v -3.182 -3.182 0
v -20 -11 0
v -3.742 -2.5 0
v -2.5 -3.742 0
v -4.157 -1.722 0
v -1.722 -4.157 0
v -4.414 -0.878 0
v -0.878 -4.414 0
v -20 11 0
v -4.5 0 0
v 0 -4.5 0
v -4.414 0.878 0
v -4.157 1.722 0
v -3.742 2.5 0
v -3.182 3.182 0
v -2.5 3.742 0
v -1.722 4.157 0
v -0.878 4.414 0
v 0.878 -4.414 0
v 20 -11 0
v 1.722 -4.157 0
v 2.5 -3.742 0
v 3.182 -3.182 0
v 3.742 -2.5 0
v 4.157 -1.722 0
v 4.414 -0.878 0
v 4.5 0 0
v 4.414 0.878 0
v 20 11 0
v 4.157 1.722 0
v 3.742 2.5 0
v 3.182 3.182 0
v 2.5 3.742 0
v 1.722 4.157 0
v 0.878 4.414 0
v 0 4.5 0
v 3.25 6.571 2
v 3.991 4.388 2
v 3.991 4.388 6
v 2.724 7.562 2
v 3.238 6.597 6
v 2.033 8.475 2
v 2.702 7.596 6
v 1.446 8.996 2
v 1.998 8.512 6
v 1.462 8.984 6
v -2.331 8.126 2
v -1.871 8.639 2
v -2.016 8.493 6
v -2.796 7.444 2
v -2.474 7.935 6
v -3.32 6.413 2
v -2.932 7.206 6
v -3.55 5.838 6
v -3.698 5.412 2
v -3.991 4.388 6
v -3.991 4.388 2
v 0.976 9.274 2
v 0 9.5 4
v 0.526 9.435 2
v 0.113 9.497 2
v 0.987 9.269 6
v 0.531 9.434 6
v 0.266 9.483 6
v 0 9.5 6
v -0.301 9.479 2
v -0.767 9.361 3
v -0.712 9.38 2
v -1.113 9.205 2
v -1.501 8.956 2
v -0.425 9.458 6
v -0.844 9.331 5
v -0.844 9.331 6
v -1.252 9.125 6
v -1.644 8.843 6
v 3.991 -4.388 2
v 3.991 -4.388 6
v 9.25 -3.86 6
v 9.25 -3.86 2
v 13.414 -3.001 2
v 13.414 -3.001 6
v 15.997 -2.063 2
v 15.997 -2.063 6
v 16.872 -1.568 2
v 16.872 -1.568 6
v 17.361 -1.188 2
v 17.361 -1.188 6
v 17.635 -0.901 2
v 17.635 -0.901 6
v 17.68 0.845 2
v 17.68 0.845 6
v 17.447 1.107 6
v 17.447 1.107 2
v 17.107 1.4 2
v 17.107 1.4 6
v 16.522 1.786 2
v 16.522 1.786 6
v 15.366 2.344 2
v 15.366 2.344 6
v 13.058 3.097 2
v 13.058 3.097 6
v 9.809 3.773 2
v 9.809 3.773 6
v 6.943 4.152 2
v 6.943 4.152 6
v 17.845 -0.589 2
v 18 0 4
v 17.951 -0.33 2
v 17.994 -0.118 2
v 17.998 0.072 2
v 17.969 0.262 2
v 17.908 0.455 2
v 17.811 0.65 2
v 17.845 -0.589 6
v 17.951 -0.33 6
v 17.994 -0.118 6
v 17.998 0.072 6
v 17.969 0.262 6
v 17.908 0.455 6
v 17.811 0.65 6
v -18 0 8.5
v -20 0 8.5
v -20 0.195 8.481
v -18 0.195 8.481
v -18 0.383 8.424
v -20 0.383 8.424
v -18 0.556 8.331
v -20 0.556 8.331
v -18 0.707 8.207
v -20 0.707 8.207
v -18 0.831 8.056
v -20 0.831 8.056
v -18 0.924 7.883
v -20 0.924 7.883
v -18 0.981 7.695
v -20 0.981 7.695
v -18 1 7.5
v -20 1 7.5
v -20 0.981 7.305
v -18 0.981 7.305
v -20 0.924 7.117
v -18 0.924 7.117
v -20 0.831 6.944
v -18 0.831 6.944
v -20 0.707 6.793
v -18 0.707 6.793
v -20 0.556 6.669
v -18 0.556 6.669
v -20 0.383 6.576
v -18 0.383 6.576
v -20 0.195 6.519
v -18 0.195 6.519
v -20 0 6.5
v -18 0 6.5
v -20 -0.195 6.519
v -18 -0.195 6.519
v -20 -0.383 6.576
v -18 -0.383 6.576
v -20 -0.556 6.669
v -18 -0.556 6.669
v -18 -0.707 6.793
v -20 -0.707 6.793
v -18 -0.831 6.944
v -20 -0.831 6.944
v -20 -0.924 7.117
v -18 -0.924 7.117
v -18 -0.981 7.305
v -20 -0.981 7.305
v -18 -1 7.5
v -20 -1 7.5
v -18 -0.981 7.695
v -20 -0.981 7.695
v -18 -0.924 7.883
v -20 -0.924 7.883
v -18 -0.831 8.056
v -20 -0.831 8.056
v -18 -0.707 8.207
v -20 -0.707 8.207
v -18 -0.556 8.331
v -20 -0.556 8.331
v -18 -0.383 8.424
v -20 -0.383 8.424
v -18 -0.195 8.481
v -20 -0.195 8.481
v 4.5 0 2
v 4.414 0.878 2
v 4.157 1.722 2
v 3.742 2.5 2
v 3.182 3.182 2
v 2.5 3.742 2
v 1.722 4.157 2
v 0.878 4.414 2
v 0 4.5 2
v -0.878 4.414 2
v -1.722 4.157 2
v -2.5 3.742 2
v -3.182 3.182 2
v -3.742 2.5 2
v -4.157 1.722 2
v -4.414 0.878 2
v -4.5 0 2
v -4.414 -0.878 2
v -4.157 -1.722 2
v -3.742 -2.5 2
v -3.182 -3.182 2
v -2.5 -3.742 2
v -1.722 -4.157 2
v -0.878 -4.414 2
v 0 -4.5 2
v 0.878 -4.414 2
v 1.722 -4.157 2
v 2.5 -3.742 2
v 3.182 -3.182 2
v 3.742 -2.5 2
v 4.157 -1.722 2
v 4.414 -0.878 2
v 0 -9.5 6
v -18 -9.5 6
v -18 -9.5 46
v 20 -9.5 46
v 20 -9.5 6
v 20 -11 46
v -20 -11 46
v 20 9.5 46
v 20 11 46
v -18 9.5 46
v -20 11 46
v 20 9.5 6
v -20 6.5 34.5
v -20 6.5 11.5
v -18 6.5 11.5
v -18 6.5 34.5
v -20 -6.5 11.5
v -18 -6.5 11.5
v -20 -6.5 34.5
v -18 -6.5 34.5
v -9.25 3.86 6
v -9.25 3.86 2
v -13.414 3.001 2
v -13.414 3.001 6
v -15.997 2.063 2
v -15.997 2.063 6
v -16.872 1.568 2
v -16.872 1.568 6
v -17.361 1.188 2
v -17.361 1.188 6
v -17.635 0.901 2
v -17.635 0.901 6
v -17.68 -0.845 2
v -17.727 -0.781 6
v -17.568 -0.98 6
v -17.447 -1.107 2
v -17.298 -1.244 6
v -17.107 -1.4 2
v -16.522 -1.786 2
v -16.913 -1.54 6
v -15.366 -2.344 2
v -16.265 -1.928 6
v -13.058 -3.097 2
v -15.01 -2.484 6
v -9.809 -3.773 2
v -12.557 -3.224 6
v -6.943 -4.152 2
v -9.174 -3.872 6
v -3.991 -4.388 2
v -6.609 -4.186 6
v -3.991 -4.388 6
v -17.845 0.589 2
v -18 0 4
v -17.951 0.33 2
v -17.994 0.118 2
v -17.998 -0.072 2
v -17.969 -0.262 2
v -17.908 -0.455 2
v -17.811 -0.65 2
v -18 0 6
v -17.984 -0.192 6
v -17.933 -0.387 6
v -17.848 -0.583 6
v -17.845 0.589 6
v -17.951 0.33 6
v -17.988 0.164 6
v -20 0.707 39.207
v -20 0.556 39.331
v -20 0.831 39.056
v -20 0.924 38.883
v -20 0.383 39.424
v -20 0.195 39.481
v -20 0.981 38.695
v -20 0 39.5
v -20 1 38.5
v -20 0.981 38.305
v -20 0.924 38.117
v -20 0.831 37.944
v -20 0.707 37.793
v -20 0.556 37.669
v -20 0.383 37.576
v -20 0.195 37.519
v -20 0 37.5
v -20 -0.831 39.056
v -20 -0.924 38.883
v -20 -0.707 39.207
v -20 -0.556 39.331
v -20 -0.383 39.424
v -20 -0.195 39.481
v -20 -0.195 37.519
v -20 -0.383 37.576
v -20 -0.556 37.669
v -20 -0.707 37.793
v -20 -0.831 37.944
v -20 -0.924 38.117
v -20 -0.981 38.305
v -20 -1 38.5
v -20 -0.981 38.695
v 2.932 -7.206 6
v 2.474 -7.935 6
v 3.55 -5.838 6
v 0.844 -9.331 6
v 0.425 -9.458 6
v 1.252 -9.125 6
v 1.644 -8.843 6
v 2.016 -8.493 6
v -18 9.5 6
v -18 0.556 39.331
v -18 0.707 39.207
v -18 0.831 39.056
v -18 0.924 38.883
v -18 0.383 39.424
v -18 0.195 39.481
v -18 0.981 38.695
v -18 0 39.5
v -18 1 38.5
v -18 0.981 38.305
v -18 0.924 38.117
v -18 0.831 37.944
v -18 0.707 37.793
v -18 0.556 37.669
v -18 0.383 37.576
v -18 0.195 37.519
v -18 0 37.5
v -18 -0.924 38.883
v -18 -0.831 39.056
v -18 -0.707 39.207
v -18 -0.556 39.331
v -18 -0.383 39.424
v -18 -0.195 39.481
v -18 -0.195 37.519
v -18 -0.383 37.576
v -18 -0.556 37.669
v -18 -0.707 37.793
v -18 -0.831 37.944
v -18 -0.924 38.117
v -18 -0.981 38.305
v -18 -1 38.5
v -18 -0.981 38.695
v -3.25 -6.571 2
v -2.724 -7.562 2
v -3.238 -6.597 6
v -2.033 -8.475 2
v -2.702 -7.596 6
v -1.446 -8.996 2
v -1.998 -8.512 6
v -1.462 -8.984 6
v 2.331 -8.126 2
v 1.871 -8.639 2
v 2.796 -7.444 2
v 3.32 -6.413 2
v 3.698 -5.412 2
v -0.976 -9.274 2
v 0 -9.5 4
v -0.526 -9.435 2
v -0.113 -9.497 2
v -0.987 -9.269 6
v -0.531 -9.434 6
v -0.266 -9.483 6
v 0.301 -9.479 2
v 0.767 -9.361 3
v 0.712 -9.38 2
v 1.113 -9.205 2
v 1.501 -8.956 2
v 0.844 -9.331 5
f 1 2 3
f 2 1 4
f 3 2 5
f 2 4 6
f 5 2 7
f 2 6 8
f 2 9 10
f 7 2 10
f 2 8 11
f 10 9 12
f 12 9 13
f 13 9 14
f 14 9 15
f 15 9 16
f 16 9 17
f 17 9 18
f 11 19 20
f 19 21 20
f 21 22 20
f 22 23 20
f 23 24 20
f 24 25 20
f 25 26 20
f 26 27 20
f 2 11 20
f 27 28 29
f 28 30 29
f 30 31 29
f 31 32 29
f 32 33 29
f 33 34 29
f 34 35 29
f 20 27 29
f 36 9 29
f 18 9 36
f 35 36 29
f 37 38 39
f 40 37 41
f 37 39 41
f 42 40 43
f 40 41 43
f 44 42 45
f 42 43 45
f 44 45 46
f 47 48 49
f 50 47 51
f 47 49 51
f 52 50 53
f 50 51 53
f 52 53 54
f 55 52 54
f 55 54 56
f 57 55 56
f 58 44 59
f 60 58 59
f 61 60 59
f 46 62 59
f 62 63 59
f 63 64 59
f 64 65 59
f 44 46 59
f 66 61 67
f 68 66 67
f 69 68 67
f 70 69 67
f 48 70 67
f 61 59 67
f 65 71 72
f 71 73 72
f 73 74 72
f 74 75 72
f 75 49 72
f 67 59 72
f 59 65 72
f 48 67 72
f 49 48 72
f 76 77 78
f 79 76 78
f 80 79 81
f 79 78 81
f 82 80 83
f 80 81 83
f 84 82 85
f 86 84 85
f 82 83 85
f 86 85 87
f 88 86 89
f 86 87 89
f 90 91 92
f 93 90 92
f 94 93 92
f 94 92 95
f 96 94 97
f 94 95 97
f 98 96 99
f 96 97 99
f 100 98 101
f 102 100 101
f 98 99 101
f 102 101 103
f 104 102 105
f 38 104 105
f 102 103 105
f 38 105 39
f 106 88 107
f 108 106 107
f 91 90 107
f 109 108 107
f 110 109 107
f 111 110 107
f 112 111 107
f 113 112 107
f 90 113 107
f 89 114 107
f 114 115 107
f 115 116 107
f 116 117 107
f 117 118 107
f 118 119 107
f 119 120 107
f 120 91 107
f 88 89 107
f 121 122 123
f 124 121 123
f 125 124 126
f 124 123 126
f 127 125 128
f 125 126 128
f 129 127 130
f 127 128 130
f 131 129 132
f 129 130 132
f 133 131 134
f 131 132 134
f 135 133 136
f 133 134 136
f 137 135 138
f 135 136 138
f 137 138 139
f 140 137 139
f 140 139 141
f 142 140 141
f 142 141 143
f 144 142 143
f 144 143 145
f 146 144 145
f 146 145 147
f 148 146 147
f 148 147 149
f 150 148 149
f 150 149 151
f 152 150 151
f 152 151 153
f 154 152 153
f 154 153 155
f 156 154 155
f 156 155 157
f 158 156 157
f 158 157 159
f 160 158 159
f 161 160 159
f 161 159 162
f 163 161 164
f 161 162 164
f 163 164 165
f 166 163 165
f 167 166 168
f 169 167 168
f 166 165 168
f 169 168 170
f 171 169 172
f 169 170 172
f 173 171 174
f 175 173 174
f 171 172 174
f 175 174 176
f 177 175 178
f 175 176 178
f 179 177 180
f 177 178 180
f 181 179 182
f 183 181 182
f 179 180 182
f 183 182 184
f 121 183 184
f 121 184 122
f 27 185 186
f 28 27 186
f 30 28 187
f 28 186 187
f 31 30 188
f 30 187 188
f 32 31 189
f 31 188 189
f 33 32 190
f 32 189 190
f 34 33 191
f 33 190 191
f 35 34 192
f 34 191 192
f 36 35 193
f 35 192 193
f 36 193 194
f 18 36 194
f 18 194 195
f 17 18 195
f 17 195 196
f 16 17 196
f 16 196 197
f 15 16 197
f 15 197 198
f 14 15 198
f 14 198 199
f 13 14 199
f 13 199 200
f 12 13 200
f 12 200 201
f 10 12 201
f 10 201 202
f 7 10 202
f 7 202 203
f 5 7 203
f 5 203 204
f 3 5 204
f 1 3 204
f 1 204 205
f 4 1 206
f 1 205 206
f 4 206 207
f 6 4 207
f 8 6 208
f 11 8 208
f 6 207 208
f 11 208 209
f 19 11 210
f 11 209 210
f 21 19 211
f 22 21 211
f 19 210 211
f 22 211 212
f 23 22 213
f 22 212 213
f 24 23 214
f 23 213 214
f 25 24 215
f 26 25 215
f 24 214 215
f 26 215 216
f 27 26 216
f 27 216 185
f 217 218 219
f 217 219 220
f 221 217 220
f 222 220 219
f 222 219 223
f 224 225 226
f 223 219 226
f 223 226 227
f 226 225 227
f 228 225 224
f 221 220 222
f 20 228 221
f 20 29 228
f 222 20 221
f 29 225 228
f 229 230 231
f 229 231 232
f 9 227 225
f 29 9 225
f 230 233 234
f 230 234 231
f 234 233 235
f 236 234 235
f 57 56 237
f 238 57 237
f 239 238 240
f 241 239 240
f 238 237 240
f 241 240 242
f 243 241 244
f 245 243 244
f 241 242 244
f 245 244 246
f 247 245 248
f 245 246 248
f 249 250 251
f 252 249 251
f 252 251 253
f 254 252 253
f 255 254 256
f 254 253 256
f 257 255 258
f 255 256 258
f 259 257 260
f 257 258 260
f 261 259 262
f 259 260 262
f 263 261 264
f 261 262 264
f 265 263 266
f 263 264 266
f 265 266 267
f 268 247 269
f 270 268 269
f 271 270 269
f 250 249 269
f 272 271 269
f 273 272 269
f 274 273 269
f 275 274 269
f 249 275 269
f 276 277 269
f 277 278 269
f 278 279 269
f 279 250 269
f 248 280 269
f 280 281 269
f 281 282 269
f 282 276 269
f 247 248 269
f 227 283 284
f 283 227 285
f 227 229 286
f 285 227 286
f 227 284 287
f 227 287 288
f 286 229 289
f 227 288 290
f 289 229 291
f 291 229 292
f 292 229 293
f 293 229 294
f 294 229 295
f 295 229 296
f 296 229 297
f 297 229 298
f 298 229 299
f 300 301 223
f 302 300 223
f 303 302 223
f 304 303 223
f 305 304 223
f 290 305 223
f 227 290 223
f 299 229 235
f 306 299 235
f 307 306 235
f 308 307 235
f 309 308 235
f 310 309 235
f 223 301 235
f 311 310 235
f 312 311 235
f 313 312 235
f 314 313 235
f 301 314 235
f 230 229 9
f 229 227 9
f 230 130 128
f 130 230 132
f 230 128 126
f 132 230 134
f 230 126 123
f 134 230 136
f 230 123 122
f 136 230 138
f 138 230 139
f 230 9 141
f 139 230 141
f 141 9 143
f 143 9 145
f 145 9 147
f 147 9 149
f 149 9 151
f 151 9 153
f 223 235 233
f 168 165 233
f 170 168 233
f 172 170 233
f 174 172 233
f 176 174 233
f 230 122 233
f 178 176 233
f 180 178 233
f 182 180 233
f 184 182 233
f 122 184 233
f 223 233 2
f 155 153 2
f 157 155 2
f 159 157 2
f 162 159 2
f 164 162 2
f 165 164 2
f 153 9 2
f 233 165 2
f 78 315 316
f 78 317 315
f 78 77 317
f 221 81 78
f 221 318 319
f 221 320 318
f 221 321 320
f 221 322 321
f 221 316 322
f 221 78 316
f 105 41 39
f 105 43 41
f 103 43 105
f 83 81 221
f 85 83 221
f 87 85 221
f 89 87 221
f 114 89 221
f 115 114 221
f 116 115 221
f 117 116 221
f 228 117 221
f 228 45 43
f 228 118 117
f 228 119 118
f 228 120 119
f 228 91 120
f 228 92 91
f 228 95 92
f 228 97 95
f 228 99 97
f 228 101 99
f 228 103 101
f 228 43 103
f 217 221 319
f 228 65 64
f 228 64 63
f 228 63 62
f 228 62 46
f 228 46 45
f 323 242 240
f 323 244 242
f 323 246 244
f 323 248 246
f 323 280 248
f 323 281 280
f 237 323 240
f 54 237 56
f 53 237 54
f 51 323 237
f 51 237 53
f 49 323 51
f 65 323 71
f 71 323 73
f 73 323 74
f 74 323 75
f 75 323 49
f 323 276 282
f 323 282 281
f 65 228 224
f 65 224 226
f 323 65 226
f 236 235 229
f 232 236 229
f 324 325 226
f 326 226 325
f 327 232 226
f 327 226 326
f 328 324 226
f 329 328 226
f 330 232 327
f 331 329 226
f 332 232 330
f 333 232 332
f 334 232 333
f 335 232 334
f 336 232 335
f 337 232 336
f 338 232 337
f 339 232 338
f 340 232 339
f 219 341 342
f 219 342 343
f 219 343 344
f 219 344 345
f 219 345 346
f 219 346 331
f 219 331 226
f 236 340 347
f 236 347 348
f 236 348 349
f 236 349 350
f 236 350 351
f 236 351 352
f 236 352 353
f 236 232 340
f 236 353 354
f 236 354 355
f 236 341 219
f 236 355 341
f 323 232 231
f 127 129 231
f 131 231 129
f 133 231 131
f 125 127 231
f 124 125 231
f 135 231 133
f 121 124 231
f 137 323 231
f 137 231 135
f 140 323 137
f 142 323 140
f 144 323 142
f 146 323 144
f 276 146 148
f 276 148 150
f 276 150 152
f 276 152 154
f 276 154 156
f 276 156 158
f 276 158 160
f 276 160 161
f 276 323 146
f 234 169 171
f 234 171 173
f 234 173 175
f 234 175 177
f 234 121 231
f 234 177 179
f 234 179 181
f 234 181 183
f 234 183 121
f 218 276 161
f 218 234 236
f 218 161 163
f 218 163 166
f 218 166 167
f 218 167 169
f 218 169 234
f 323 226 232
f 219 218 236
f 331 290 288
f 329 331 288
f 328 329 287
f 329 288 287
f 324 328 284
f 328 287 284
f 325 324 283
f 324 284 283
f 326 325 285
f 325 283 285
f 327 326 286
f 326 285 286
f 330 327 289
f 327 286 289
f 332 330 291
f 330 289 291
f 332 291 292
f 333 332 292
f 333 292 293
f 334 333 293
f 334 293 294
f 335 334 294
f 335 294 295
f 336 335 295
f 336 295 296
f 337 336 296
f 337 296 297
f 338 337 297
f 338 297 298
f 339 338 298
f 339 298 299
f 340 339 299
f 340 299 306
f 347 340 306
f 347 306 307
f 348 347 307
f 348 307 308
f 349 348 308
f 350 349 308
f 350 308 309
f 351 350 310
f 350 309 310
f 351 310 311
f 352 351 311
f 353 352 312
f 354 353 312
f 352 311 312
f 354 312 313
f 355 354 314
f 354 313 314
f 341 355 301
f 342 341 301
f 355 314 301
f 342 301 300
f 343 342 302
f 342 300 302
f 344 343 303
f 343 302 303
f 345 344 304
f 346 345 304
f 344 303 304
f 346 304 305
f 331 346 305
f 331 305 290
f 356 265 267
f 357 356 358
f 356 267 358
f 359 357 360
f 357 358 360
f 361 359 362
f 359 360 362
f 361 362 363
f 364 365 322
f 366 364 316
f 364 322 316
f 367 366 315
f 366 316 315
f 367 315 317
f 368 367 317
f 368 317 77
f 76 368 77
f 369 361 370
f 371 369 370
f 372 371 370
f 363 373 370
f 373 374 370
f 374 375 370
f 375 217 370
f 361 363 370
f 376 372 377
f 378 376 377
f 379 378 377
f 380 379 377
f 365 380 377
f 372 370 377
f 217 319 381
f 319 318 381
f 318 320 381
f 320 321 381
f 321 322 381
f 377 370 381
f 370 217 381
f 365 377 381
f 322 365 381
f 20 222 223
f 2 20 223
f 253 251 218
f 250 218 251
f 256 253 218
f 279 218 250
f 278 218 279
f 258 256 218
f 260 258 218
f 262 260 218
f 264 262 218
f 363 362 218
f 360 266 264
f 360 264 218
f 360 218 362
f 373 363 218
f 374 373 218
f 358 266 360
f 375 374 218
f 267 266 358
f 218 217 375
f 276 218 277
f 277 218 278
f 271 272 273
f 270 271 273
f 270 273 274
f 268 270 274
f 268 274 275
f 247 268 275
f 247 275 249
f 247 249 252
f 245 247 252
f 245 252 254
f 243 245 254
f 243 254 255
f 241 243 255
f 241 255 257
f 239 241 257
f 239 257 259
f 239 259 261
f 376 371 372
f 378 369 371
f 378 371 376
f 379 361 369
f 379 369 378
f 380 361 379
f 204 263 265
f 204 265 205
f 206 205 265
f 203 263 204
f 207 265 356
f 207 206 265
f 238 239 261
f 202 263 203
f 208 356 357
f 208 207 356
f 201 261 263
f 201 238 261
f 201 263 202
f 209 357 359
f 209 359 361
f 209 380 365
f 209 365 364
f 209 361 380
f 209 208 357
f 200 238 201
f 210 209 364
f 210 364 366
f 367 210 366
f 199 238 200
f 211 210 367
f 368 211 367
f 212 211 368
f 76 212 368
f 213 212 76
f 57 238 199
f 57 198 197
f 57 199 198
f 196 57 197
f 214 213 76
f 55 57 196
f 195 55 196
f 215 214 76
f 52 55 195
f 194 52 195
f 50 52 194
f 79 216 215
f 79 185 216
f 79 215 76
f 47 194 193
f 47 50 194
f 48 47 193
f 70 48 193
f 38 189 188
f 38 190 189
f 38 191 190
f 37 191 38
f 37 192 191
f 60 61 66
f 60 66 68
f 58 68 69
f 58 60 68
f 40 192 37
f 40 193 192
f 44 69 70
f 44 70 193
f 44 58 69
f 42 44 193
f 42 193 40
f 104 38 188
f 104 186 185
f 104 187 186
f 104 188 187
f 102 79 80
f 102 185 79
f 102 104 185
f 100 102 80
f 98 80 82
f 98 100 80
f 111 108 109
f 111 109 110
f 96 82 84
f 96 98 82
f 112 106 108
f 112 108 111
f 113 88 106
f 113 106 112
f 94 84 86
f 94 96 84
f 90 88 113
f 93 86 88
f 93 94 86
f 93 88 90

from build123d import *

# Parameters (mm, degrees)
SKETCH_1_W          = 40
SKETCH_1_H          = 22
SKETCH_1_R          = 4.5
EXTRUDE_1_DEPTH     = 6
CUT_EXTRUDE_2_DEPTH = 4
SKETCH_4_R          = 4.5
CUT_EXTRUDE_3_DEPTH = 7
EXTRUDE_2_DEPTH     = 40
SKETCH_6_W          = 23
SKETCH_6_H          = 13
CUT_EXTRUDE_4_DEPTH = 40
SKETCH_7_R          = 1
CUT_EXTRUDE_5_DEPTH = 40


with BuildPart() as part:
    # 草图1 → 凸台-拉伸1 (new body)
    with BuildSketch(Plane.XY):
        Rectangle(SKETCH_1_W, SKETCH_1_H)
        with BuildLine():
            add(Edge.make_bspline(
                [(3.991210712, -4.387982431), (18, -3.591602336), (18, 0), (18, 3.591602336), (3.991210712, 4.387982431)],
                knots=[4.935981285, 4.935981285, 4.935981285, 6.283185307, 6.283185307, 7.630389329, 7.630389329, 7.630389329], degree=2, weights=[1, 0.781579788, 1, 0.781579788, 1]))
            add(Edge.make_bspline(
                [(3.991210712, 4.387982431), (0, 20.567539049), (-3.991210712, 4.387982431)],
                knots=[5.192517184, 5.192517184, 5.192517184, 7.373853431, 7.373853431, 7.373853431], degree=2, weights=[1, 0.461892887, 1]))
            add(Edge.make_bspline(
                [(-3.991210712, 4.387982431), (-18, 3.591602336), (-18, 0), (-18, -3.591602336), (-3.991210712, -4.387982431)],
                knots=[1.794388632, 1.794388632, 1.794388632, 3.141592654, 3.141592654, 4.488796676, 4.488796676, 4.488796676], degree=2, weights=[1, 0.781579788, 1, 0.781579788, 1]))
            add(Edge.make_bspline(
                [(-3.991210712, -4.387982431), (0, -20.567539049), (3.991210712, -4.387982431)],
                knots=[2.05092453, 2.05092453, 2.05092453, 4.232260777, 4.232260777, 4.232260777], degree=2, weights=[1, 0.461892887, 1]))
        make_face(mode=Mode.SUBTRACT)
        with BuildLine():
            add(Edge.make_bspline(
                [(-3.991210712, -4.387982431), (0, -20.567539049), (3.991210712, -4.387982431)],
                knots=[2.05092453, 2.05092453, 2.05092453, 4.232260777, 4.232260777, 4.232260777], degree=2, weights=[1, 0.461892887, 1]))
            add(Edge.make_bspline(
                [(3.991210712, -4.387982431), (18, -3.591602336), (18, 0), (18, 3.591602336), (3.991210712, 4.387982431)],
                knots=[4.935981285, 4.935981285, 4.935981285, 6.283185307, 6.283185307, 7.630389329, 7.630389329, 7.630389329], degree=2, weights=[1, 0.781579788, 1, 0.781579788, 1]))
            add(Edge.make_bspline(
                [(3.991210712, 4.387982431), (0, 20.567539049), (-3.991210712, 4.387982431)],
                knots=[5.192517184, 5.192517184, 5.192517184, 7.373853431, 7.373853431, 7.373853431], degree=2, weights=[1, 0.461892887, 1]))
            add(Edge.make_bspline(
                [(-3.991210712, 4.387982431), (-18, 3.591602336), (-18, 0), (-18, -3.591602336), (-3.991210712, -4.387982431)],
                knots=[1.794388632, 1.794388632, 1.794388632, 3.141592654, 3.141592654, 4.488796676, 4.488796676, 4.488796676], degree=2, weights=[1, 0.781579788, 1, 0.781579788, 1]))
        make_face()
        Circle(SKETCH_1_R, mode=Mode.SUBTRACT)
        Circle(SKETCH_1_R)
    extrude(amount=EXTRUDE_1_DEPTH)

    # 草图3 → 切除-拉伸2 (cut)
    with BuildSketch(Plane.XY.offset(6)):
        with BuildLine():
            add(Edge.make_bspline(
                [(3.991210712, -4.387982431), (18, -3.591602336), (18, 0), (18, 3.591602336), (3.991210712, 4.387982431)],
                knots=[4.935981285, 4.935981285, 4.935981285, 6.283185307, 6.283185307, 7.630389329, 7.630389329, 7.630389329], degree=2, weights=[1, 0.781579788, 1, 0.781579788, 1]))
            add(Edge.make_bspline(
                [(3.991210712, 4.387982431), (0, 20.567539049), (-3.991210712, 4.387982431)],
                knots=[5.192517184, 5.192517184, 5.192517184, 7.373853431, 7.373853431, 7.373853431], degree=2, weights=[1, 0.461892887, 1]))
            add(Edge.make_bspline(
                [(-3.991210712, 4.387982431), (-18, 3.591602336), (-18, 0), (-18, -3.591602336), (-3.991210712, -4.387982431)],
                knots=[1.794388632, 1.794388632, 1.794388632, 3.141592654, 3.141592654, 4.488796676, 4.488796676, 4.488796676], degree=2, weights=[1, 0.781579788, 1, 0.781579788, 1]))
            add(Edge.make_bspline(
                [(-3.991210712, -4.387982431), (0, -20.567539049), (3.991210712, -4.387982431)],
                knots=[2.05092453, 2.05092453, 2.05092453, 4.232260777, 4.232260777, 4.232260777], degree=2, weights=[1, 0.461892887, 1]))
        make_face()
    extrude(amount=-CUT_EXTRUDE_2_DEPTH, mode=Mode.SUBTRACT)

    # 草图4 → 切除-拉伸3 (cut, through all)
    with BuildSketch(Plane.XY.offset(6)):
        Circle(SKETCH_4_R)
    extrude(amount=-CUT_EXTRUDE_3_DEPTH, mode=Mode.SUBTRACT)

    # 草图5 → 凸台-拉伸2 (add)
    with BuildSketch(Plane.XY.offset(6)):
        Polygon((20, -11), (-20, -11), (-20, -9.5), (-20, 9.5), (-20, 11), (20, 11), (20, 9.5), (-18, 9.5), (-18, -9.5), (20, -9.5), align=None)
    extrude(amount=EXTRUDE_2_DEPTH)

    # 草图6 → 切除-拉伸4 (cut)
    with BuildSketch(Plane.ZY.offset(20)):
        with Locations((23, 0)):
            Rectangle(SKETCH_6_W, SKETCH_6_H)
    extrude(amount=-CUT_EXTRUDE_4_DEPTH, mode=Mode.SUBTRACT)

    # 草图7 → 切除-拉伸5 (cut)
    with BuildSketch(Plane.ZY.offset(20)):
        with Locations((38.5, 0)):
            Circle(SKETCH_7_R)
        with Locations((7.5, 0)):
            Circle(SKETCH_7_R)
    extrude(amount=-CUT_EXTRUDE_5_DEPTH, mode=Mode.SUBTRACT)


solid = part.part
